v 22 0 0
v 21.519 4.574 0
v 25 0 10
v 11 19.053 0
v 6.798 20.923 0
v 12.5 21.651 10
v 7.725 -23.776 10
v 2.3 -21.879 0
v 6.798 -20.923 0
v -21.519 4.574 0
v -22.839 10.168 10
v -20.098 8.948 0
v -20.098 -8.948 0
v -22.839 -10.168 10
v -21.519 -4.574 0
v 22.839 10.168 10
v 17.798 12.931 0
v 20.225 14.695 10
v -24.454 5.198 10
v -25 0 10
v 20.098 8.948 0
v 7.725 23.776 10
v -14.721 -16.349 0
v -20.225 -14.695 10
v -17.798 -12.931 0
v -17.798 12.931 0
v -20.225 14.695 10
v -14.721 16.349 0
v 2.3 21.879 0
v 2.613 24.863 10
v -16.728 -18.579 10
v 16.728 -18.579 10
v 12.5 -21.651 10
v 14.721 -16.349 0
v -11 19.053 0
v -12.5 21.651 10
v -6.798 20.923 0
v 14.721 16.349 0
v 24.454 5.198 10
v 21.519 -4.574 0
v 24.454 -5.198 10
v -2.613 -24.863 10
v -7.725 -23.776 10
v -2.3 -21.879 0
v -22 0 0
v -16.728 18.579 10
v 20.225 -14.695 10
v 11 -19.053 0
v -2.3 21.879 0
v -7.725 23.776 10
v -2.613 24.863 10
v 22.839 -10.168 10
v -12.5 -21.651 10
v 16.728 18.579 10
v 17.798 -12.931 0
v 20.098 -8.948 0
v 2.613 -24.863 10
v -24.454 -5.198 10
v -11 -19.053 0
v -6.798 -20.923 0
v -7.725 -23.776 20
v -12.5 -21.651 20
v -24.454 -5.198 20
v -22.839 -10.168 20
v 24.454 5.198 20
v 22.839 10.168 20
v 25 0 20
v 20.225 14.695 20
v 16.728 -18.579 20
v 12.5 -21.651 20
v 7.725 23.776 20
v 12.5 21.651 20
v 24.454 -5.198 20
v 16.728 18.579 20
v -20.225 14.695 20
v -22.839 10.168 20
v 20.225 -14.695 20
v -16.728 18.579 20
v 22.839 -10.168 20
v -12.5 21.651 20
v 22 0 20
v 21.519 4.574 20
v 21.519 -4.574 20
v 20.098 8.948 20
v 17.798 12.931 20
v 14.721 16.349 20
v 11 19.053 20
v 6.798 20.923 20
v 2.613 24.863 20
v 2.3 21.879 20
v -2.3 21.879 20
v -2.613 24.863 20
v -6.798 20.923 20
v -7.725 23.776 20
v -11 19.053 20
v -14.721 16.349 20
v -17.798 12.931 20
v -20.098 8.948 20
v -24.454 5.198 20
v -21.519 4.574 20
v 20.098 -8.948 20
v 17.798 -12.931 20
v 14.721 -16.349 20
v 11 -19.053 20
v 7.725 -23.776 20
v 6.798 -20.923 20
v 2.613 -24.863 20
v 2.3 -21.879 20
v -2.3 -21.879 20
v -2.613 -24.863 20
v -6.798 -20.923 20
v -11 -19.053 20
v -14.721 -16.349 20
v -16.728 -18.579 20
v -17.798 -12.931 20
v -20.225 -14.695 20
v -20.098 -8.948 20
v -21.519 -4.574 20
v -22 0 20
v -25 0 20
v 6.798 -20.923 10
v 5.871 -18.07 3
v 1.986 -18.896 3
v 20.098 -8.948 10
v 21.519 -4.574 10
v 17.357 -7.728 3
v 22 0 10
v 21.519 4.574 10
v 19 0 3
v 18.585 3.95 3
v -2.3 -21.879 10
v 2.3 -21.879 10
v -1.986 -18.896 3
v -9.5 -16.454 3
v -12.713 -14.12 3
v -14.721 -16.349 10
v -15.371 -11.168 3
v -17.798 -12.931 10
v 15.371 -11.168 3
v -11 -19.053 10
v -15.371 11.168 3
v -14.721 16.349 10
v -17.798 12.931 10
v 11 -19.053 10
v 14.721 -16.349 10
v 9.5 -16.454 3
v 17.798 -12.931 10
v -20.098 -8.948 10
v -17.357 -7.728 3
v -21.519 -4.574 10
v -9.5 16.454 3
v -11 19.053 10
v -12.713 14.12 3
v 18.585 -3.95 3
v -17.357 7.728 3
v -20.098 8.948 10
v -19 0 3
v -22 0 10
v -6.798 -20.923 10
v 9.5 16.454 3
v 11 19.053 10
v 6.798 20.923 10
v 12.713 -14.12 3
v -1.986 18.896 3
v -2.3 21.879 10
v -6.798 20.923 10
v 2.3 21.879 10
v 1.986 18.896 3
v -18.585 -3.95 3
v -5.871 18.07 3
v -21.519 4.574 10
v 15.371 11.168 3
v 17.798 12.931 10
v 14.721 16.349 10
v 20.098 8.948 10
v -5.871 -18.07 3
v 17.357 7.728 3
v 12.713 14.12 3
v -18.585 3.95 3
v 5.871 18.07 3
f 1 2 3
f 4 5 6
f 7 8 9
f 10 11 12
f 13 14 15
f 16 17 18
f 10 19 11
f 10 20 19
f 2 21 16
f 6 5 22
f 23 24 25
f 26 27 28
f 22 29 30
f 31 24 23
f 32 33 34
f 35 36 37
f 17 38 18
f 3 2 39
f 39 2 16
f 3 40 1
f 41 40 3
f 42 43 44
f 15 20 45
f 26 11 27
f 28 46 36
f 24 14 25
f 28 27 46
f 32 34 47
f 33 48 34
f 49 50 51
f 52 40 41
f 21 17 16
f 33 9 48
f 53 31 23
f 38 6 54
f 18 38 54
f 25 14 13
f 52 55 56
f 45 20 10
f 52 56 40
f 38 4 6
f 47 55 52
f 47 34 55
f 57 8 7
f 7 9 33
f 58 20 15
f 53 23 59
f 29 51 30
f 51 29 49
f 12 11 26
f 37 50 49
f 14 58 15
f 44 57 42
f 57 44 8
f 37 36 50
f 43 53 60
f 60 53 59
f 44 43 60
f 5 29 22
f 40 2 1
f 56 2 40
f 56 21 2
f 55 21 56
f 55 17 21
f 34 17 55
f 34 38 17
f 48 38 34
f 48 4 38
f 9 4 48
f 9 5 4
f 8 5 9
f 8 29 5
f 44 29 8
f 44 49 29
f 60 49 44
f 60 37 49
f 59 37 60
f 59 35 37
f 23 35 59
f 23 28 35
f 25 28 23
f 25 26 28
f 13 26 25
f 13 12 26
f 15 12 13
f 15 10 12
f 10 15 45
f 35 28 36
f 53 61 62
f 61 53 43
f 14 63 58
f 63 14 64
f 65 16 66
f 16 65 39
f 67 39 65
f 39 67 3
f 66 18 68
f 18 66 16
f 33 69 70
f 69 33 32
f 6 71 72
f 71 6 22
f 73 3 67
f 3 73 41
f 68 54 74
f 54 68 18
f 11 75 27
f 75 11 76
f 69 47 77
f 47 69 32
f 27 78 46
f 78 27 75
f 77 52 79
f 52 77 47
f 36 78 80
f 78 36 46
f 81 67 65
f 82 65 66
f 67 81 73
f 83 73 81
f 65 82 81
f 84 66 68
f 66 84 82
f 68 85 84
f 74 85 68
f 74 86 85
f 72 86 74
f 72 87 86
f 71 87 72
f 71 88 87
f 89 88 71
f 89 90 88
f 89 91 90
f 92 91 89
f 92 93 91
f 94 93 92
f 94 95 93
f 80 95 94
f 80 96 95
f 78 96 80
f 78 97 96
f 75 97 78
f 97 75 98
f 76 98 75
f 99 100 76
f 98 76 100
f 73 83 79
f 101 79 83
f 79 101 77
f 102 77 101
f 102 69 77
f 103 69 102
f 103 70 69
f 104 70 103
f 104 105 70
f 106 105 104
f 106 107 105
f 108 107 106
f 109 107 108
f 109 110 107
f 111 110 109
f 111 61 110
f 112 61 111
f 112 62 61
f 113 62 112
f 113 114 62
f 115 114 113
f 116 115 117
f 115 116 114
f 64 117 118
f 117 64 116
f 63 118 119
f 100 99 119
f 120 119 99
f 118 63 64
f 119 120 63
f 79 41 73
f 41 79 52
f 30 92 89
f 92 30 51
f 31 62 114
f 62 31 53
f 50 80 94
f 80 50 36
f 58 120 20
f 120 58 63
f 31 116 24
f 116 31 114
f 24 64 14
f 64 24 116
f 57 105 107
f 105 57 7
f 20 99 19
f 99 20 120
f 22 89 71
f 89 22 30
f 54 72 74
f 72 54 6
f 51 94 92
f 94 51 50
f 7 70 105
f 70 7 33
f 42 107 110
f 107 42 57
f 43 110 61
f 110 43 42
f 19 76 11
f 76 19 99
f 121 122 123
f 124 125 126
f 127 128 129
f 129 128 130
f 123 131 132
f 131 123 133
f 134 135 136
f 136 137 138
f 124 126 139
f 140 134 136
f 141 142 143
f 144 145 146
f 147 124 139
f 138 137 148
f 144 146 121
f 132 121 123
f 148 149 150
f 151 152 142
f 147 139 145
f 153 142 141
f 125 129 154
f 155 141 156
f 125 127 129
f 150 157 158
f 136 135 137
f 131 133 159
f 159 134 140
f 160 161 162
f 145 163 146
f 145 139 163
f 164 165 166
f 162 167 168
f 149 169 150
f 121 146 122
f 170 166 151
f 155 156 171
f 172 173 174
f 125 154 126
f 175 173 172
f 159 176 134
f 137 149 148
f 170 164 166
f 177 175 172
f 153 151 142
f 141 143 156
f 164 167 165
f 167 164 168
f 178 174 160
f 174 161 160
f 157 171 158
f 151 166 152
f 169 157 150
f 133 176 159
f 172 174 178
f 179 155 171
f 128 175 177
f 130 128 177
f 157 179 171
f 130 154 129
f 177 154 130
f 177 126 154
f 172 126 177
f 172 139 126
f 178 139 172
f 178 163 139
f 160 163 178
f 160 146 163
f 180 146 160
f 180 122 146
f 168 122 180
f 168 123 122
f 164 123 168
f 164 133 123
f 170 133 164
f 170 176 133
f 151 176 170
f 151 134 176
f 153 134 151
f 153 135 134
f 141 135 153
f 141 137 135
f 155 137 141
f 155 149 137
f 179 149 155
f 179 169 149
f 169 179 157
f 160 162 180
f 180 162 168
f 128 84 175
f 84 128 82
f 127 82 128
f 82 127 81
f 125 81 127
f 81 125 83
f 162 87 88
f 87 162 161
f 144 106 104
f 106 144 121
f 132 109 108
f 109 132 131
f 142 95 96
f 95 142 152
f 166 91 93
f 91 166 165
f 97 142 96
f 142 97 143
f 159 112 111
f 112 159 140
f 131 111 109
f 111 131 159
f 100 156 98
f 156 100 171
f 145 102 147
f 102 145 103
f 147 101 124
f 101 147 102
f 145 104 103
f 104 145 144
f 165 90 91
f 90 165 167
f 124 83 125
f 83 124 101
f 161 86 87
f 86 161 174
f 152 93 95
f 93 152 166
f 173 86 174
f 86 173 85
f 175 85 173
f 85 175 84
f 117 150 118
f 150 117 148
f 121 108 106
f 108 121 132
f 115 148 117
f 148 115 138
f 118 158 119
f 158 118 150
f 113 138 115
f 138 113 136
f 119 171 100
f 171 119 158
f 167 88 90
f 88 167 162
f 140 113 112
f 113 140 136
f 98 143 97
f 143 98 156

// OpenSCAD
radius = 25;
wall_thickness = 3;
bottom_radius = radius - wall_thickness;

height = 10;

inner_radius = radius - wall_thickness;
inner_bottom_radius = bottom_radius - wall_thickness;
bottom_offset = height - wall_thickness;

difference() {
    union() {
        cylinder(h=height, r1=bottom_radius, r2=radius);
        translate([0, 0, height]) {
            cylinder(h=height, r=radius);
        }
    }

    // Inside Cup
    translate([0, 0, wall_thickness]) {
        union() {
            cylinder(h=bottom_offset, r1=inner_bottom_radius, r2=inner_radius);
            translate([0, 0, bottom_offset]) {
                cylinder(h=height, r=inner_radius);
            }
        }
    }
}
